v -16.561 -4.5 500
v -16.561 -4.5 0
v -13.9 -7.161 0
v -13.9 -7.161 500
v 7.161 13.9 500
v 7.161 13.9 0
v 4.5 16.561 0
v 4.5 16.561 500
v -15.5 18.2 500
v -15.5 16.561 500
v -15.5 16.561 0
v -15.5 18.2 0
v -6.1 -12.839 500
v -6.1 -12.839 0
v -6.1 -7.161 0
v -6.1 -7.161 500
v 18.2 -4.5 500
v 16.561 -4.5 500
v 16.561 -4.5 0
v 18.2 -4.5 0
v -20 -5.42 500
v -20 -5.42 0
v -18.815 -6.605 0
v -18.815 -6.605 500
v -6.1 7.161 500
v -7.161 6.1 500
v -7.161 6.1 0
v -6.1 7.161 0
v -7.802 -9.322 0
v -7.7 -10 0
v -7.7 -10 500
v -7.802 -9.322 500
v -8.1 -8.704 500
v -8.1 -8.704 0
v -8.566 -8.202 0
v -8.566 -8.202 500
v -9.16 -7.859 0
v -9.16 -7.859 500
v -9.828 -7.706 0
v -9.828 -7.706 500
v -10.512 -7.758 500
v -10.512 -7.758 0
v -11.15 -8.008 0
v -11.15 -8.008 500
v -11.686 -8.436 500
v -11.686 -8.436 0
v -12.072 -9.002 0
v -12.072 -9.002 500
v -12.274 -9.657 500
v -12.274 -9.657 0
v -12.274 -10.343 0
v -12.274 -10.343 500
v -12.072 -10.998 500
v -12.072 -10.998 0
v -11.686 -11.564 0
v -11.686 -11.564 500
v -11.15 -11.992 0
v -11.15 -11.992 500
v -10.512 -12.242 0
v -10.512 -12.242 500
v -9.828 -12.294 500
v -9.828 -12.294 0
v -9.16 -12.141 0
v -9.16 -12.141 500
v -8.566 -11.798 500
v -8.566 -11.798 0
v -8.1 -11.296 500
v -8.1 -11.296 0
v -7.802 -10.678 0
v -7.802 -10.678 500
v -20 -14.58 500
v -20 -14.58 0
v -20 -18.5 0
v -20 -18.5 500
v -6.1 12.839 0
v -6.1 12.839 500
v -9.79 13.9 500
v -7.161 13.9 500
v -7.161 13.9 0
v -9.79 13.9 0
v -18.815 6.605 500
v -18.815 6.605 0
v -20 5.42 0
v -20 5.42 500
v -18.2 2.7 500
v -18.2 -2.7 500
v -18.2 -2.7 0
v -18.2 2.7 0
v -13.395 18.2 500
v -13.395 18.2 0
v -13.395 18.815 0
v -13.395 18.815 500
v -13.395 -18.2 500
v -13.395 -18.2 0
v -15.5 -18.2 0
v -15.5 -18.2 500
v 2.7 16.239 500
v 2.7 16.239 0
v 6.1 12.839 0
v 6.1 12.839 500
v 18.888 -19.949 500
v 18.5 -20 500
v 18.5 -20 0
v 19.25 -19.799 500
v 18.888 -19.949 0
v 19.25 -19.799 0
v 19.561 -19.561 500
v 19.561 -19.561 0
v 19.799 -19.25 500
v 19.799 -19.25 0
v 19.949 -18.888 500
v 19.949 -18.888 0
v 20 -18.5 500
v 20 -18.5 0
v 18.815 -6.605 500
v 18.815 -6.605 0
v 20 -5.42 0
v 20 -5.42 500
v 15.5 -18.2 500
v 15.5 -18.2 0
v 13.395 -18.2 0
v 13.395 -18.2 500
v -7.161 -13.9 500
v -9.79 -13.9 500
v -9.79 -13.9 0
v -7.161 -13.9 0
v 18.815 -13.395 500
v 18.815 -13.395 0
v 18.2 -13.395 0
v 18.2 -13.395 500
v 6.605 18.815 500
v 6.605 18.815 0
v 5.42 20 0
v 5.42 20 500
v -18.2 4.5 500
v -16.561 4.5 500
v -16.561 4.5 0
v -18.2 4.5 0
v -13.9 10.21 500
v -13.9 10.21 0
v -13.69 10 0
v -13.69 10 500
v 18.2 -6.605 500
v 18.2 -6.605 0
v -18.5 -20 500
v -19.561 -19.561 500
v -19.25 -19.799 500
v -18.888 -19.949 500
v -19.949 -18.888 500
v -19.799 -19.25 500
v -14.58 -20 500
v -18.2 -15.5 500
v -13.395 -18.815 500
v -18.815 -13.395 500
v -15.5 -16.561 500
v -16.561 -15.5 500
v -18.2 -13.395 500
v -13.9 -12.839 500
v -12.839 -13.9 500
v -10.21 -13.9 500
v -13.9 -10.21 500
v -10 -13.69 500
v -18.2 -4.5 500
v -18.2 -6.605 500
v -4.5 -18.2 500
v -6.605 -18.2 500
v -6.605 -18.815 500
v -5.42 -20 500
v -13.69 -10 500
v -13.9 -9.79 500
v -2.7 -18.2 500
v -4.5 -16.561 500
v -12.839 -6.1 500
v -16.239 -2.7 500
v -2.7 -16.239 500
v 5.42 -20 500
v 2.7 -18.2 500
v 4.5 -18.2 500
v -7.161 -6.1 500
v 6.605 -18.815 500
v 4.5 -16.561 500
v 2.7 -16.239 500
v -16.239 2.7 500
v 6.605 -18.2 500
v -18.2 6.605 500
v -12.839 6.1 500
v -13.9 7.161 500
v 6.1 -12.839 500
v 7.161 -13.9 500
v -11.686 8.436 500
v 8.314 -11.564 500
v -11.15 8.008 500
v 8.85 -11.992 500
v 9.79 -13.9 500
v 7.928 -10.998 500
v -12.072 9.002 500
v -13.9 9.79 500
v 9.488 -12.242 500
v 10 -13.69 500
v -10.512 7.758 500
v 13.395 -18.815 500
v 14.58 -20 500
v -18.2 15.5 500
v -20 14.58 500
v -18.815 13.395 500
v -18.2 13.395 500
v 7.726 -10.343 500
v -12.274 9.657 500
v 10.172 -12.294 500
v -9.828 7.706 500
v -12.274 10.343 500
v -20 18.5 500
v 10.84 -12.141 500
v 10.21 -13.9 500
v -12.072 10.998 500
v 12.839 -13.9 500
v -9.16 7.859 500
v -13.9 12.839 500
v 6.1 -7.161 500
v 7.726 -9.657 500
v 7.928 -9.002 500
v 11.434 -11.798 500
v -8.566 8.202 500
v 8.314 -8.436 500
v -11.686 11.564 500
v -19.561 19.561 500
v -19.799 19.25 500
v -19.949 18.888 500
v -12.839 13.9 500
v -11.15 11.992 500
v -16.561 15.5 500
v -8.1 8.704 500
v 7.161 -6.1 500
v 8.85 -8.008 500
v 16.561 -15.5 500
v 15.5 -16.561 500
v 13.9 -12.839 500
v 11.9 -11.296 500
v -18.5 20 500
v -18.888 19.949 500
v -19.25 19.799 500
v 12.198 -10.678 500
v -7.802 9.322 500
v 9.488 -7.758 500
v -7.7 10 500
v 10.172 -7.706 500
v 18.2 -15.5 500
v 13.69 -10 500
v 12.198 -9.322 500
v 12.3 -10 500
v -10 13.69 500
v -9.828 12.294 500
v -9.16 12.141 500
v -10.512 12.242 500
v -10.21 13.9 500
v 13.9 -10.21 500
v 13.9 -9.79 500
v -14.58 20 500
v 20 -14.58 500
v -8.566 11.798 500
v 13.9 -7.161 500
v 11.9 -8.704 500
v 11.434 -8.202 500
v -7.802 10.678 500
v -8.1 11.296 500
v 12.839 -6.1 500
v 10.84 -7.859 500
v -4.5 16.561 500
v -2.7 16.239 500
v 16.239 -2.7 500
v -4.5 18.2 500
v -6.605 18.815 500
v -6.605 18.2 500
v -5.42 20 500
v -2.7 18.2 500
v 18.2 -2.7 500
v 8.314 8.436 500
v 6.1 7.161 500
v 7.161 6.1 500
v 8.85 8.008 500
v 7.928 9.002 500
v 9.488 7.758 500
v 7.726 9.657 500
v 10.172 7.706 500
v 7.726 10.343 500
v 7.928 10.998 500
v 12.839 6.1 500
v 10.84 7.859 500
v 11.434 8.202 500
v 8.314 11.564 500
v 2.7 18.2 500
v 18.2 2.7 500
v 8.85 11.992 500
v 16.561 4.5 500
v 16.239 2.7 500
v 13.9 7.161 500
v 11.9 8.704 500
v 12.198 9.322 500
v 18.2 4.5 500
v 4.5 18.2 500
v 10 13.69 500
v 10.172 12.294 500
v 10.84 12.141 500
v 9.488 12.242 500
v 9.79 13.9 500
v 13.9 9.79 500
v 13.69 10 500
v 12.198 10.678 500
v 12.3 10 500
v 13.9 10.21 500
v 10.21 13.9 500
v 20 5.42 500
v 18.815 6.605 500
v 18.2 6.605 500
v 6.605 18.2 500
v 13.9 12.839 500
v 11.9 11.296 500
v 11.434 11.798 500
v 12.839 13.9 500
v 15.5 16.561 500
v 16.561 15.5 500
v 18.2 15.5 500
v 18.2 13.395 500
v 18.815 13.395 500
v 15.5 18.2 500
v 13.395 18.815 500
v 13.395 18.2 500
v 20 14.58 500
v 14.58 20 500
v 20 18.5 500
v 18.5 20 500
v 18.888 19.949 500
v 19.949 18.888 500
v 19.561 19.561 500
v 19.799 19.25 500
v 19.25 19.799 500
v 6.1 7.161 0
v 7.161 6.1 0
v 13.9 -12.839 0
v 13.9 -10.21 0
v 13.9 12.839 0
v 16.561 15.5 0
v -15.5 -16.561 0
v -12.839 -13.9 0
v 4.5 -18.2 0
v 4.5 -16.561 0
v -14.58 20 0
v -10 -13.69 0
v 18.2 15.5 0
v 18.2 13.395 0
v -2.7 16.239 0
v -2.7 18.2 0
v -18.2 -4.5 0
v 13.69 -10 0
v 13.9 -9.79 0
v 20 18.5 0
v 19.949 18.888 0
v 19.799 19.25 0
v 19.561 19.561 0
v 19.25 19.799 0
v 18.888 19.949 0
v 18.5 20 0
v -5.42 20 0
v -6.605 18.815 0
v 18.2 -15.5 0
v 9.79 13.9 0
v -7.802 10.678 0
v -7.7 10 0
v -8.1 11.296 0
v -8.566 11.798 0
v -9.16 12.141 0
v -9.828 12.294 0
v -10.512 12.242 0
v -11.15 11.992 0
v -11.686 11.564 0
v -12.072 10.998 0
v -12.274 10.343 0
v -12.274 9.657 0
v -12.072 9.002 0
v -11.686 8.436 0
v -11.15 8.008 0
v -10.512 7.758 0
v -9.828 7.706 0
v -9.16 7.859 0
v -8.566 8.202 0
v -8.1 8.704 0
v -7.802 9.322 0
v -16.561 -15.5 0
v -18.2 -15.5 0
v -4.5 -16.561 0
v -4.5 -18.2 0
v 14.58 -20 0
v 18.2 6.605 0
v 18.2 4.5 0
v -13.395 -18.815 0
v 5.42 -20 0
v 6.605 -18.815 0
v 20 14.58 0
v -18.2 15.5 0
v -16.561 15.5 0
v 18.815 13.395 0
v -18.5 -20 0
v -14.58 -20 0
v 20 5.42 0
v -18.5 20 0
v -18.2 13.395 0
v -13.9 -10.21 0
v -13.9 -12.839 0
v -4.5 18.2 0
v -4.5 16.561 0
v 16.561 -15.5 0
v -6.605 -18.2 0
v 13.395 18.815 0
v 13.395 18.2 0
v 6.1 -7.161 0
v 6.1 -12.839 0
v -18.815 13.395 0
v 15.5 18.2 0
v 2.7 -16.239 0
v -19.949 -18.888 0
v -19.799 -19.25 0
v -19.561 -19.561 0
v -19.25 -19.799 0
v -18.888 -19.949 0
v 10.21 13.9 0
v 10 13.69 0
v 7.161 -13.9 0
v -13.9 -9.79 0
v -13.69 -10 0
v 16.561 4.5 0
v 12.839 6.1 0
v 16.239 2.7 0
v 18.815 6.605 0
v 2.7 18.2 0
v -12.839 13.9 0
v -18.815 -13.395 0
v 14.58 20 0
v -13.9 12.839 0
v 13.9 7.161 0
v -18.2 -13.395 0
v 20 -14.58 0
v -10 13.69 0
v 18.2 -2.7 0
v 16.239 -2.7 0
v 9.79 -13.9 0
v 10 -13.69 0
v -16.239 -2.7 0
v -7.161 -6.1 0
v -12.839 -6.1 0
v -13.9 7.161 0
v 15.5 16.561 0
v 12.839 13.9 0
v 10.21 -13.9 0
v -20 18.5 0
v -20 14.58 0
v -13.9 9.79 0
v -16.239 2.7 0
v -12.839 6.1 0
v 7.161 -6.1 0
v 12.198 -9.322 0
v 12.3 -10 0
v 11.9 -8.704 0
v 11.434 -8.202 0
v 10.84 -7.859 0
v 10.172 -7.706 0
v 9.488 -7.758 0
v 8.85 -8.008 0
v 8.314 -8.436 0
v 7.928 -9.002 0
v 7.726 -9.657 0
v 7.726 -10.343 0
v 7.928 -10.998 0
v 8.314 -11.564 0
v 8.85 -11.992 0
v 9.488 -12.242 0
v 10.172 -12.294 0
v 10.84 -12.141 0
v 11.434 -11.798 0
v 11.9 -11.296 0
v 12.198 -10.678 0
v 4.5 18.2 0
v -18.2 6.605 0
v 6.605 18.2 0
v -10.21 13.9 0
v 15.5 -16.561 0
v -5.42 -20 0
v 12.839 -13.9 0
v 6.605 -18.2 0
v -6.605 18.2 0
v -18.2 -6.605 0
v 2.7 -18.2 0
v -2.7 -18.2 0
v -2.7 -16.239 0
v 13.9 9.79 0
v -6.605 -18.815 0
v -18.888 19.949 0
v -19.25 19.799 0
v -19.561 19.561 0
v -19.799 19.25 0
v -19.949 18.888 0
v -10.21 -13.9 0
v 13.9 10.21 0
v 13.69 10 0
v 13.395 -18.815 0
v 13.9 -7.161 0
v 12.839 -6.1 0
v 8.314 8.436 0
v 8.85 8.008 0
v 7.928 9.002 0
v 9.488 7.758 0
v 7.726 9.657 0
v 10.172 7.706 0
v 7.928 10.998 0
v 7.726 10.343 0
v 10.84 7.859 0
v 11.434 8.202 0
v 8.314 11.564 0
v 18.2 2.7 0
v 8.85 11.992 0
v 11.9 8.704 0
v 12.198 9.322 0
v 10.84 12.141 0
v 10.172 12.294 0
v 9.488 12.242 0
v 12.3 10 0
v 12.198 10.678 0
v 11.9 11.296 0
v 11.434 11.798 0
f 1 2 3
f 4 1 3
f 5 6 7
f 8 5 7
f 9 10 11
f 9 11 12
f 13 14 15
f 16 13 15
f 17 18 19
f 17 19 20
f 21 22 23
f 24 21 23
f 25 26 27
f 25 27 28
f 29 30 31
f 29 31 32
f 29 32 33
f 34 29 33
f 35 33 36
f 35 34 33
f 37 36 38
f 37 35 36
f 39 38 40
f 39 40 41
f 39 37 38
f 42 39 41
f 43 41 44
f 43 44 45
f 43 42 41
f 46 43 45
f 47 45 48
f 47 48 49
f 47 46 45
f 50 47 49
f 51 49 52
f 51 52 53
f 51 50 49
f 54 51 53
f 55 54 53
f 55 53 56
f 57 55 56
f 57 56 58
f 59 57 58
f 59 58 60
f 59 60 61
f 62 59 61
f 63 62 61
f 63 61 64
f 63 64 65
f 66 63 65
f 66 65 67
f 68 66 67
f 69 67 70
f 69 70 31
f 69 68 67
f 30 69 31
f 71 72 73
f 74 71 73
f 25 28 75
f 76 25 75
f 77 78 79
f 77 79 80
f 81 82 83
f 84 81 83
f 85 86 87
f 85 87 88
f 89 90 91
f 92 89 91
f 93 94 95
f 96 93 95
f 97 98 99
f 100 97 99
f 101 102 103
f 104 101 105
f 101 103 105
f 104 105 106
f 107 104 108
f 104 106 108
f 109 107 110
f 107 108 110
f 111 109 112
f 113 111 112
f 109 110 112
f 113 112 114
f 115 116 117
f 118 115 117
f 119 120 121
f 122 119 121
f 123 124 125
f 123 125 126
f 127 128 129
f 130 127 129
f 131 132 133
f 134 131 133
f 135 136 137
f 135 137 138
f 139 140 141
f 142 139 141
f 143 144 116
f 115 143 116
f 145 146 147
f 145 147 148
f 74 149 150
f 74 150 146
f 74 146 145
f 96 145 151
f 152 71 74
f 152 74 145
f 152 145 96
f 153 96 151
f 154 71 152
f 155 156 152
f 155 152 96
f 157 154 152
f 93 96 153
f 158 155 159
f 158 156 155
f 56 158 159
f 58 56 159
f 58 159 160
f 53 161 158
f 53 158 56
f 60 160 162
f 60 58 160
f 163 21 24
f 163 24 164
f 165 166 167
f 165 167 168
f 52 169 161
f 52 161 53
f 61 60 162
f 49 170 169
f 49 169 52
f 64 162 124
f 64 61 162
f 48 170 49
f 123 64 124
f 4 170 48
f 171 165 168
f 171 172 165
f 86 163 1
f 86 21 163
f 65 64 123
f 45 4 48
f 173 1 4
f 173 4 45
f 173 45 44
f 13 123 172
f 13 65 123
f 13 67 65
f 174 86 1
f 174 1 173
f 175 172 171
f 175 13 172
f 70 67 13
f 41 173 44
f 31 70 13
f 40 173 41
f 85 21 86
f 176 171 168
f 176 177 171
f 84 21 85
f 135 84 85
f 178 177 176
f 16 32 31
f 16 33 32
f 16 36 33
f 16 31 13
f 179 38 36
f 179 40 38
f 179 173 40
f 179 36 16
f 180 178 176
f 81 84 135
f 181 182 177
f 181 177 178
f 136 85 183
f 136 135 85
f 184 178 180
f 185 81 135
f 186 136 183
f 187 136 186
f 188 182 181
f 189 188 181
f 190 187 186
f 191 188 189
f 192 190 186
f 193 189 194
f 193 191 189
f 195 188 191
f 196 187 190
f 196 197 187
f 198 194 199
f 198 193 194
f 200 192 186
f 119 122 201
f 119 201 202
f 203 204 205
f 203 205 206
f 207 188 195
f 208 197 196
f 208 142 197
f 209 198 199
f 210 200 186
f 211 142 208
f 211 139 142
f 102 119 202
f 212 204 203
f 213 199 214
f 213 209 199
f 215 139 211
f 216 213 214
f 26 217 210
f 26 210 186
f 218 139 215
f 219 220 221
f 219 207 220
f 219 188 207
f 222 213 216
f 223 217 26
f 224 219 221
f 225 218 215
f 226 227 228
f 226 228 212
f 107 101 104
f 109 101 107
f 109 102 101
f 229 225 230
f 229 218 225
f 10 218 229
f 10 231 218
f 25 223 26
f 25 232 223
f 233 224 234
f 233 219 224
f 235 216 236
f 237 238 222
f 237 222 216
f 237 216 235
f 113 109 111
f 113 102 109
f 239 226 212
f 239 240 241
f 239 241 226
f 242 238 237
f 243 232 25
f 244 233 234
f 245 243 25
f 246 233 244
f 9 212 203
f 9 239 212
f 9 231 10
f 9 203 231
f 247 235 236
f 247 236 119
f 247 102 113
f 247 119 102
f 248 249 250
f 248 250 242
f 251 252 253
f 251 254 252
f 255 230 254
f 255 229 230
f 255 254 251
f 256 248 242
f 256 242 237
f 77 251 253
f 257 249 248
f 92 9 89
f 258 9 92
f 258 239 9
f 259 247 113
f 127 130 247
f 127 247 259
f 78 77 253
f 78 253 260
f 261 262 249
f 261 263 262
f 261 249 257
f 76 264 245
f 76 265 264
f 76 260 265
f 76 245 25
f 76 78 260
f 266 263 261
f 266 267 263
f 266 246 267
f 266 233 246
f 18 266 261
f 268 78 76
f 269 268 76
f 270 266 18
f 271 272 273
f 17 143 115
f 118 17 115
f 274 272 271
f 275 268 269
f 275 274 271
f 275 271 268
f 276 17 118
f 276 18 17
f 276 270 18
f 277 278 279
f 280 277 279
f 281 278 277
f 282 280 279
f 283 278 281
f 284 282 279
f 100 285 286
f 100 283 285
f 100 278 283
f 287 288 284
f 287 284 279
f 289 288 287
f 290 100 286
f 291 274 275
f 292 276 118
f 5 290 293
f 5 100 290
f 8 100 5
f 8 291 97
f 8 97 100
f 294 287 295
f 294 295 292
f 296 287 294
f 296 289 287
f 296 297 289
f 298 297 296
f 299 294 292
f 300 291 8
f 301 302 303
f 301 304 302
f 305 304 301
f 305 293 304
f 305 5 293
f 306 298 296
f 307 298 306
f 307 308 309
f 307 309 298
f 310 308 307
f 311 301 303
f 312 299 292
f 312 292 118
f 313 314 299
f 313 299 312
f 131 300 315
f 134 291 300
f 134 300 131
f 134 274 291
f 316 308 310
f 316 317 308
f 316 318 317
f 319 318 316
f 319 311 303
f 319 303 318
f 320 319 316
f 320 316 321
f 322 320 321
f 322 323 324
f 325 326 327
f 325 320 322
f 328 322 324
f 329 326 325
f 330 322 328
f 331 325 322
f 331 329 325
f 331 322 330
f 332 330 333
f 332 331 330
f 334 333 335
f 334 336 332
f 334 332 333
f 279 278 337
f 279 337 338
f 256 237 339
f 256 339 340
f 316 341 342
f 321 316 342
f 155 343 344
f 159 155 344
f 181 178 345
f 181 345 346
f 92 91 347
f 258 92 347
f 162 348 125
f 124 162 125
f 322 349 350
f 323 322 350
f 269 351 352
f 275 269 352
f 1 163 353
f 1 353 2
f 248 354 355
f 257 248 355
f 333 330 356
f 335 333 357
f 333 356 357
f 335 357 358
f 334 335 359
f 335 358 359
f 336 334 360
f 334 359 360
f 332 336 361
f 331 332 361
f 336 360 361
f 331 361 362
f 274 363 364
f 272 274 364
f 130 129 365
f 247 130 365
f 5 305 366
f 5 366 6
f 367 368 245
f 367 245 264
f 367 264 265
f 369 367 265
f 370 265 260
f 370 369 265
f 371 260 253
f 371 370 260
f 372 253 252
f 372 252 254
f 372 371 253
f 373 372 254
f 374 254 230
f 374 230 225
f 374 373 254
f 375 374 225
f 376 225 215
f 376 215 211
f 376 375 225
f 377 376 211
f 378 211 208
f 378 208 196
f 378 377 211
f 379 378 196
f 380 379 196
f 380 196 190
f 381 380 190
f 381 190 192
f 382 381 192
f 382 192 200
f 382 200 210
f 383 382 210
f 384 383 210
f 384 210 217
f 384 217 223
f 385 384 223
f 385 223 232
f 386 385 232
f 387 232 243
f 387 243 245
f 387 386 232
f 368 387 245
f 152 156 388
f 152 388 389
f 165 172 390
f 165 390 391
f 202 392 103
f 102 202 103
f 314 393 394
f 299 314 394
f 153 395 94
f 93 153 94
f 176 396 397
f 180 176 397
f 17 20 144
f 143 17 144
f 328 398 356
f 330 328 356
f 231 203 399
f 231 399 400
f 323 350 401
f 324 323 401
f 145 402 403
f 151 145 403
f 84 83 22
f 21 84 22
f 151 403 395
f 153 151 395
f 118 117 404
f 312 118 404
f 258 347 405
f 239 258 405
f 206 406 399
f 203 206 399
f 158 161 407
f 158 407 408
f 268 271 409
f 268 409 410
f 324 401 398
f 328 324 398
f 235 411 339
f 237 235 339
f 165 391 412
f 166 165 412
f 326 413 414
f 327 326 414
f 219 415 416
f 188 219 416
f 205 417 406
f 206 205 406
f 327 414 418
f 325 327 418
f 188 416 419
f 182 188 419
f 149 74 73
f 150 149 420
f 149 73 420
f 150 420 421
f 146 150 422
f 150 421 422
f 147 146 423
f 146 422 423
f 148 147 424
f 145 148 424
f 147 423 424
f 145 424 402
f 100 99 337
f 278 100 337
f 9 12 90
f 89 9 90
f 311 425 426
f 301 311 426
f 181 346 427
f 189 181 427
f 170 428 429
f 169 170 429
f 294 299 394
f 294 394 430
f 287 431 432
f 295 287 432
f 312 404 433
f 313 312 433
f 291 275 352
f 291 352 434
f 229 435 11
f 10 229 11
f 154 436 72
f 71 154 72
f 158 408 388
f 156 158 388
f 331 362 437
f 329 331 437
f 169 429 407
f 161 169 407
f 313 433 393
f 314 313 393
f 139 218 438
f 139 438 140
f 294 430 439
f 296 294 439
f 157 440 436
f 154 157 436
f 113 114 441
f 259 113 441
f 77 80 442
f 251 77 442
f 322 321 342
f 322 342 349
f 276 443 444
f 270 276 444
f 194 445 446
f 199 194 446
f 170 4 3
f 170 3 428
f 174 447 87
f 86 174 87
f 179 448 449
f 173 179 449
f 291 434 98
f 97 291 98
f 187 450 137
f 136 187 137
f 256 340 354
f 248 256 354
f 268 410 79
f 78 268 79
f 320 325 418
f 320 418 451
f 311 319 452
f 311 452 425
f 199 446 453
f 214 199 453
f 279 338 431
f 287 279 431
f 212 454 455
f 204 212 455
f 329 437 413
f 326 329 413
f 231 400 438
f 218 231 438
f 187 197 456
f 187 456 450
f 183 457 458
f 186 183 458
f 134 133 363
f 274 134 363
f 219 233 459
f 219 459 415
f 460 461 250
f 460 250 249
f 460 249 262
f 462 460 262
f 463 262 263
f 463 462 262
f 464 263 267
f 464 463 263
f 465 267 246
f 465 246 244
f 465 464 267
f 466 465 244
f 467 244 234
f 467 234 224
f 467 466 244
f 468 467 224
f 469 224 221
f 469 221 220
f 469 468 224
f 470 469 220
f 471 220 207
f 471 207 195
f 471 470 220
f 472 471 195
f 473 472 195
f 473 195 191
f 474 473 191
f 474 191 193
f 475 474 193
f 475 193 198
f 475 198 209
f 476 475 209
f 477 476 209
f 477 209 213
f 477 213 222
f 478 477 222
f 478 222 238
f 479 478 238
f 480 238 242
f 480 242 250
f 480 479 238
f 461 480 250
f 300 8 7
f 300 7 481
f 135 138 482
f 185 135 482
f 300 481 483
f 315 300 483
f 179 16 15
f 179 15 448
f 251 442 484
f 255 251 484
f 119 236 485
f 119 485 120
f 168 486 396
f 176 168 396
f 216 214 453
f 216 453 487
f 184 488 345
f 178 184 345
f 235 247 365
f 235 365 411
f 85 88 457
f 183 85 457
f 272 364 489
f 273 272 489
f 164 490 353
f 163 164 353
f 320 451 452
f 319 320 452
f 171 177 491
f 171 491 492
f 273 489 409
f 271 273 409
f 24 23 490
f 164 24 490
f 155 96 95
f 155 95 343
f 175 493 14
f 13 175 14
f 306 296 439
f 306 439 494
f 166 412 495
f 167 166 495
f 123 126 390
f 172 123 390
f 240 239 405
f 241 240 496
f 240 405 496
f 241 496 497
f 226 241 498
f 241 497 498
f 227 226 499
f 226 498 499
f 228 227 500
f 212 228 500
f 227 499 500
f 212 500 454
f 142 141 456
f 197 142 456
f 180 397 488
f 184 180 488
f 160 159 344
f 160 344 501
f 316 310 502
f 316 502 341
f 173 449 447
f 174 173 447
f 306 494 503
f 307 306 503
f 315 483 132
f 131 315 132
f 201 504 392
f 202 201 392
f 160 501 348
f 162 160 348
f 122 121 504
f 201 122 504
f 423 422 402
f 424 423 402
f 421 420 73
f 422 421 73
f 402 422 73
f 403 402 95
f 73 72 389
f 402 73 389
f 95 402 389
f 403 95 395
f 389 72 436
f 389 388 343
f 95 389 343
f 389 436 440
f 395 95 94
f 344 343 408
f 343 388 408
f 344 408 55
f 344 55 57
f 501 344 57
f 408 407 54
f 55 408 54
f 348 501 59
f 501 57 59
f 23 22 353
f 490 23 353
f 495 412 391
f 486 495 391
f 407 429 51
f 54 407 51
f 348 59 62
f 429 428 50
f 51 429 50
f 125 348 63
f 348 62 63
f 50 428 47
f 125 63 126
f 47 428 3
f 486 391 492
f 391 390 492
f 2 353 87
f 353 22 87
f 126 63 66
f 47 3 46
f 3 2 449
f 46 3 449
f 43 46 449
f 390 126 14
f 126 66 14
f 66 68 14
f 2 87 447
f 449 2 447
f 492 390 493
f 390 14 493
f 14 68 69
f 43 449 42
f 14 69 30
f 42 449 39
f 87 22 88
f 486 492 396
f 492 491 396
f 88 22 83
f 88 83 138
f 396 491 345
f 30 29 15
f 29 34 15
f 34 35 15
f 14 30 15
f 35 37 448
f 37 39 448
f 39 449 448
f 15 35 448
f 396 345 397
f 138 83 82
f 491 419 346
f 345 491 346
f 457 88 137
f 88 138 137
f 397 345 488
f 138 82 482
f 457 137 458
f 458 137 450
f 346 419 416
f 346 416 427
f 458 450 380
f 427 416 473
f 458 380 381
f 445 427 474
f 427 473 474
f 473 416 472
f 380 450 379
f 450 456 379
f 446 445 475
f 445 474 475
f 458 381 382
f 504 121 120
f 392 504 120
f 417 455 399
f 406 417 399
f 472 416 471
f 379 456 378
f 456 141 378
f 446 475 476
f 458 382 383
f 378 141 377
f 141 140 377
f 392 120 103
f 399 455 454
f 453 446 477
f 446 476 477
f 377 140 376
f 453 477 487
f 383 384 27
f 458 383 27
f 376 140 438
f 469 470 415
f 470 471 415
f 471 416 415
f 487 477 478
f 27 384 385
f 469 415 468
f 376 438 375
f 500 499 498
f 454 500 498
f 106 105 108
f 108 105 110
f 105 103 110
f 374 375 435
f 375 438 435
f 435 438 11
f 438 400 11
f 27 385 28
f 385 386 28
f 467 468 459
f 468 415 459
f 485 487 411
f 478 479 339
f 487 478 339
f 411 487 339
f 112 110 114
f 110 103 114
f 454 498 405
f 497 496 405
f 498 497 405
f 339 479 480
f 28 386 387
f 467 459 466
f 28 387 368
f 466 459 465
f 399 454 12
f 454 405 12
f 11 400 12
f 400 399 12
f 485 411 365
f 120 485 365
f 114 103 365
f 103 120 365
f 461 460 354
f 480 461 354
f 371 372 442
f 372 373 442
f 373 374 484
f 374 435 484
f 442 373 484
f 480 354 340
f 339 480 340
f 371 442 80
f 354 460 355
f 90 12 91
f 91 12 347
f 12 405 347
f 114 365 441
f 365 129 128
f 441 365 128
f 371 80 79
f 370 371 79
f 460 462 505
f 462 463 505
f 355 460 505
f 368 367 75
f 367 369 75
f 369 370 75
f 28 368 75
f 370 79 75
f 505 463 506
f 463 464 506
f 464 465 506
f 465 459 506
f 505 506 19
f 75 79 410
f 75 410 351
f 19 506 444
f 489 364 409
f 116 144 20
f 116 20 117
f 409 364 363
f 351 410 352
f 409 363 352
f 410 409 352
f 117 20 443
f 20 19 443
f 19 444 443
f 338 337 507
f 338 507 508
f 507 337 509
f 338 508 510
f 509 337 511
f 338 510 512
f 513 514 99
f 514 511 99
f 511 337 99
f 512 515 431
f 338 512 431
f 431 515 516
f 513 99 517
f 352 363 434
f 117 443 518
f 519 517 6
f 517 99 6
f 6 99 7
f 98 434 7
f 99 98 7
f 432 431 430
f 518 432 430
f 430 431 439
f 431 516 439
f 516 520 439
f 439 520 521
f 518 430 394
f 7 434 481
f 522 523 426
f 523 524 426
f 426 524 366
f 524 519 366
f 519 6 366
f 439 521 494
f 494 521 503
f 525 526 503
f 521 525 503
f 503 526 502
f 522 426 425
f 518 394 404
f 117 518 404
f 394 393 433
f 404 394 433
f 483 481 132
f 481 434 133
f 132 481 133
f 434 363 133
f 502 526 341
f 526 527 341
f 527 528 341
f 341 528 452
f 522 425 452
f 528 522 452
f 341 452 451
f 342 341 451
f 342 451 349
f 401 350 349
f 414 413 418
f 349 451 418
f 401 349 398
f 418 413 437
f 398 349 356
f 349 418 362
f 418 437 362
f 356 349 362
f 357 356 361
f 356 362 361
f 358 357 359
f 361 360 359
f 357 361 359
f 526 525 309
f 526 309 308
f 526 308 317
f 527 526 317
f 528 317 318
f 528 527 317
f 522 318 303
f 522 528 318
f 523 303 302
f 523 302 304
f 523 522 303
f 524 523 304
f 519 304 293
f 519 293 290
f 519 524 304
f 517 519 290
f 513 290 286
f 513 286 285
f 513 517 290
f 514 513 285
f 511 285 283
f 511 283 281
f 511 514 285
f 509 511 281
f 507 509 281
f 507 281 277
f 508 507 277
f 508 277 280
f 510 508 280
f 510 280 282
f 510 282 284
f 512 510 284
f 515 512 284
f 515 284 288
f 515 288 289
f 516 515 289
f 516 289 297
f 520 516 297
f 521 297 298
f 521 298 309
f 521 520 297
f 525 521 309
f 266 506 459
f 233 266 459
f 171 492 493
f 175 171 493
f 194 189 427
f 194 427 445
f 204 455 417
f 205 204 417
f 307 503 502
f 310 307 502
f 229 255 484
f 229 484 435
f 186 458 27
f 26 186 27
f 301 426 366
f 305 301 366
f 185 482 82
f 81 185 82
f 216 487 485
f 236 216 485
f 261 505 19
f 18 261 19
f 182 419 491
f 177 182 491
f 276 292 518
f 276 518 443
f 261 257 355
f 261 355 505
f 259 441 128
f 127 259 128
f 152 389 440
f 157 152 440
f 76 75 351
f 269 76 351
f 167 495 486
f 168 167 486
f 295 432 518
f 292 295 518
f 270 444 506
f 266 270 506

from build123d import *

# Parameters (mm, degrees)
SKETCH1_R           = 2.3
BOSS_EXTRUDE1_DEPTH = 500


with BuildPart() as part:
    # Sketch1 → Boss-Extrude1 (new body)
    with BuildSketch(Plane.XY):
        with BuildLine():
            Line((14.58, -20), (18.5, -20))
            ThreePointArc((18.5, -20), (19.560660172, -19.560660172), (20, -18.5))
            Line((20, -18.5), (20, -14.58))
            Line((20, -14.58), (18.815, -13.395))
            Line((18.815, -13.395), (18.2, -13.395))
            Line((18.2, -13.395), (18.2, -15.5))
            Line((18.2, -15.5), (16.560660172, -15.5))
            Line((16.560660172, -15.5), (13.9, -12.839339828))
            Line((13.9, -12.839339828), (13.9, -10.21))
            Line((13.9, -10.21), (13.69, -10))
            Line((13.69, -10), (13.9, -9.79))
            Line((13.9, -9.79), (13.9, -7.160660172))
            Line((13.9, -7.160660172), (16.560660172, -4.5))
            Line((16.560660172, -4.5), (18.2, -4.5))
            Line((18.2, -4.5), (18.2, -6.605))
            Line((18.2, -6.605), (18.815, -6.605))
            Line((18.815, -6.605), (20, -5.42))
            Line((20, -5.42), (20, 5.42))
            Line((20, 5.42), (18.815, 6.605))
            Line((18.815, 6.605), (18.2, 6.605))
            Line((18.2, 6.605), (18.2, 4.5))
            Line((18.2, 4.5), (16.560660172, 4.5))
            Line((16.560660172, 4.5), (13.9, 7.160660172))
            Line((13.9, 7.160660172), (13.9, 9.79))
            Line((13.9, 9.79), (13.69, 10))
            Line((13.69, 10), (13.9, 10.21))
            Line((13.9, 10.21), (13.9, 12.839339828))
            Line((13.9, 12.839339828), (16.560660172, 15.5))
            Line((16.560660172, 15.5), (18.2, 15.5))
            Line((18.2, 15.5), (18.2, 13.395))
            Line((18.2, 13.395), (18.815, 13.395))
            Line((18.815, 13.395), (20, 14.58))
            Line((20, 14.58), (20, 18.5))
            ThreePointArc((20, 18.5), (19.560660172, 19.560660172), (18.5, 20))
            Line((18.5, 20), (14.58, 20))
            Line((14.58, 20), (13.395, 18.815))
            Line((13.395, 18.815), (13.395, 18.2))
            Line((13.395, 18.2), (15.5, 18.2))
            Line((15.5, 18.2), (15.5, 16.560660172))
            Line((15.5, 16.560660172), (12.839339828, 13.9))
            Line((12.839339828, 13.9), (10.21, 13.9))
            Line((10.21, 13.9), (10, 13.69))
            Line((10, 13.69), (9.79, 13.9))
            Line((9.79, 13.9), (7.160660172, 13.9))
            Line((7.160660172, 13.9), (4.5, 16.560660172))
            Line((4.5, 16.560660172), (4.5, 18.2))
            Line((4.5, 18.2), (6.605, 18.2))
            Line((6.605, 18.2), (6.605, 18.815))
            Line((6.605, 18.815), (5.42, 20))
            Line((5.42, 20), (-5.42, 20))
            Line((-5.42, 20), (-6.605, 18.815))
            Line((-6.605, 18.815), (-6.605, 18.2))
            Line((-6.605, 18.2), (-4.5, 18.2))
            Line((-4.5, 18.2), (-4.5, 16.560660172))
            Line((-4.5, 16.560660172), (-7.160660172, 13.9))
            Line((-7.160660172, 13.9), (-9.79, 13.9))
            Line((-9.79, 13.9), (-10, 13.69))
            Line((-10, 13.69), (-10.21, 13.9))
            Line((-10.21, 13.9), (-12.839339828, 13.9))
            Line((-12.839339828, 13.9), (-15.5, 16.560660172))
            Line((-15.5, 16.560660172), (-15.5, 18.2))
            Line((-15.5, 18.2), (-13.395, 18.2))
            Line((-13.395, 18.2), (-13.395, 18.815))
            Line((-13.395, 18.815), (-14.58, 20))
            Line((-14.58, 20), (-18.5, 20))
            ThreePointArc((-18.5, 20), (-19.560660172, 19.560660172), (-20, 18.5))
            Line((-20, 18.5), (-20, 14.58))
            Line((-20, 14.58), (-18.815, 13.395))
            Line((-18.815, 13.395), (-18.2, 13.395))
            Line((-18.2, 13.395), (-18.2, 15.5))
            Line((-18.2, 15.5), (-16.560660172, 15.5))
            Line((-16.560660172, 15.5), (-13.9, 12.839339828))
            Line((-13.9, 12.839339828), (-13.9, 10.21))
            Line((-13.9, 10.21), (-13.69, 10))
            Line((-13.69, 10), (-13.9, 9.79))
            Line((-13.9, 9.79), (-13.9, 7.160660172))
            Line((-13.9, 7.160660172), (-16.560660172, 4.5))
            Line((-16.560660172, 4.5), (-18.2, 4.5))
            Line((-18.2, 4.5), (-18.2, 6.605))
            Line((-18.2, 6.605), (-18.815, 6.605))
            Line((-18.815, 6.605), (-20, 5.42))
            Line((-20, 5.42), (-20, -5.42))
            Line((-20, -5.42), (-18.815, -6.605))
            Line((-18.815, -6.605), (-18.2, -6.605))
            Line((-18.2, -6.605), (-18.2, -4.5))
            Line((-18.2, -4.5), (-16.560660172, -4.5))
            Line((-16.560660172, -4.5), (-13.9, -7.160660172))
            Line((-13.9, -7.160660172), (-13.9, -9.79))
            Line((-13.9, -9.79), (-13.69, -10))
            Line((-13.69, -10), (-13.9, -10.21))
            Line((-13.9, -10.21), (-13.9, -12.839339828))
            Line((-13.9, -12.839339828), (-16.560660172, -15.5))
            Line((-16.560660172, -15.5), (-18.2, -15.5))
            Line((-18.2, -15.5), (-18.2, -13.395))
            Line((-18.2, -13.395), (-18.815, -13.395))
            Line((-18.815, -13.395), (-20, -14.58))
            Line((-20, -14.58), (-20, -18.5))
            ThreePointArc((-20, -18.5), (-19.560660172, -19.560660172), (-18.5, -20))
            Line((-18.5, -20), (-14.58, -20))
            Line((-14.58, -20), (-13.395, -18.815))
            Line((-13.395, -18.815), (-13.395, -18.2))
            Line((-13.395, -18.2), (-15.5, -18.2))
            Line((-15.5, -18.2), (-15.5, -16.560660172))
            Line((-15.5, -16.560660172), (-12.839339828, -13.9))
            Line((-12.839339828, -13.9), (-10.21, -13.9))
            Line((-10.21, -13.9), (-10, -13.69))
            Line((-10, -13.69), (-9.79, -13.9))
            Line((-9.79, -13.9), (-7.160660172, -13.9))
            Line((-7.160660172, -13.9), (-4.5, -16.560660172))
            Line((-4.5, -16.560660172), (-4.5, -18.2))
            Line((-4.5, -18.2), (-6.605, -18.2))
            Line((-6.605, -18.2), (-6.605, -18.815))
            Line((-6.605, -18.815), (-5.42, -20))
            Line((-5.42, -20), (5.42, -20))
            Line((5.42, -20), (6.605, -18.815))
            Line((6.605, -18.815), (6.605, -18.2))
            Line((6.605, -18.2), (4.5, -18.2))
            Line((4.5, -18.2), (4.5, -16.560660172))
            Line((4.5, -16.560660172), (7.160660172, -13.9))
            Line((7.160660172, -13.9), (9.79, -13.9))
            Line((9.79, -13.9), (10, -13.69))
            Line((10, -13.69), (10.21, -13.9))
            Line((10.21, -13.9), (12.839339828, -13.9))
            Line((12.839339828, -13.9), (15.5, -16.560660172))
            Line((15.5, -16.560660172), (15.5, -18.2))
            Line((15.5, -18.2), (13.395, -18.2))
            Line((13.395, -18.2), (13.395, -18.815))
            Line((13.395, -18.815), (14.58, -20))
        make_face()
        with Locations((-10, -10)):
            Circle(SKETCH1_R, mode=Mode.SUBTRACT)
        with Locations((10, -10)):
            Circle(SKETCH1_R, mode=Mode.SUBTRACT)
        Polygon((-16.239339828, -2.7), (-18.2, -2.7), (-18.2, 2.7), (-16.239339828, 2.7), (-12.839339828, 6.1), (-7.160660172, 6.1), (-6.1, 7.160660172), (-6.1, 12.839339828), (-2.7, 16.239339828), (-2.7, 18.2), (2.7, 18.2), (2.7, 16.239339828), (6.1, 12.839339828), (6.1, 7.160660172), (7.160660172, 6.1), (12.839339828, 6.1), (16.239339828, 2.7), (18.2, 2.7), (18.2, -2.7), (16.239339828, -2.7), (12.839339828, -6.1), (7.160660172, -6.1), (6.1, -7.160660172), (6.1, -12.839339828), (2.7, -16.239339828), (2.7, -18.2), (-2.7, -18.2), (-2.7, -16.239339828), (-6.1, -12.839339828), (-6.1, -7.160660172), (-7.160660172, -6.1), (-12.839339828, -6.1), align=None, mode=Mode.SUBTRACT)
        with Locations((-10, 10)):
            Circle(SKETCH1_R, mode=Mode.SUBTRACT)
        with Locations((10, 10)):
            Circle(SKETCH1_R, mode=Mode.SUBTRACT)
    extrude(amount=BOSS_EXTRUDE1_DEPTH)


solid = part.part
